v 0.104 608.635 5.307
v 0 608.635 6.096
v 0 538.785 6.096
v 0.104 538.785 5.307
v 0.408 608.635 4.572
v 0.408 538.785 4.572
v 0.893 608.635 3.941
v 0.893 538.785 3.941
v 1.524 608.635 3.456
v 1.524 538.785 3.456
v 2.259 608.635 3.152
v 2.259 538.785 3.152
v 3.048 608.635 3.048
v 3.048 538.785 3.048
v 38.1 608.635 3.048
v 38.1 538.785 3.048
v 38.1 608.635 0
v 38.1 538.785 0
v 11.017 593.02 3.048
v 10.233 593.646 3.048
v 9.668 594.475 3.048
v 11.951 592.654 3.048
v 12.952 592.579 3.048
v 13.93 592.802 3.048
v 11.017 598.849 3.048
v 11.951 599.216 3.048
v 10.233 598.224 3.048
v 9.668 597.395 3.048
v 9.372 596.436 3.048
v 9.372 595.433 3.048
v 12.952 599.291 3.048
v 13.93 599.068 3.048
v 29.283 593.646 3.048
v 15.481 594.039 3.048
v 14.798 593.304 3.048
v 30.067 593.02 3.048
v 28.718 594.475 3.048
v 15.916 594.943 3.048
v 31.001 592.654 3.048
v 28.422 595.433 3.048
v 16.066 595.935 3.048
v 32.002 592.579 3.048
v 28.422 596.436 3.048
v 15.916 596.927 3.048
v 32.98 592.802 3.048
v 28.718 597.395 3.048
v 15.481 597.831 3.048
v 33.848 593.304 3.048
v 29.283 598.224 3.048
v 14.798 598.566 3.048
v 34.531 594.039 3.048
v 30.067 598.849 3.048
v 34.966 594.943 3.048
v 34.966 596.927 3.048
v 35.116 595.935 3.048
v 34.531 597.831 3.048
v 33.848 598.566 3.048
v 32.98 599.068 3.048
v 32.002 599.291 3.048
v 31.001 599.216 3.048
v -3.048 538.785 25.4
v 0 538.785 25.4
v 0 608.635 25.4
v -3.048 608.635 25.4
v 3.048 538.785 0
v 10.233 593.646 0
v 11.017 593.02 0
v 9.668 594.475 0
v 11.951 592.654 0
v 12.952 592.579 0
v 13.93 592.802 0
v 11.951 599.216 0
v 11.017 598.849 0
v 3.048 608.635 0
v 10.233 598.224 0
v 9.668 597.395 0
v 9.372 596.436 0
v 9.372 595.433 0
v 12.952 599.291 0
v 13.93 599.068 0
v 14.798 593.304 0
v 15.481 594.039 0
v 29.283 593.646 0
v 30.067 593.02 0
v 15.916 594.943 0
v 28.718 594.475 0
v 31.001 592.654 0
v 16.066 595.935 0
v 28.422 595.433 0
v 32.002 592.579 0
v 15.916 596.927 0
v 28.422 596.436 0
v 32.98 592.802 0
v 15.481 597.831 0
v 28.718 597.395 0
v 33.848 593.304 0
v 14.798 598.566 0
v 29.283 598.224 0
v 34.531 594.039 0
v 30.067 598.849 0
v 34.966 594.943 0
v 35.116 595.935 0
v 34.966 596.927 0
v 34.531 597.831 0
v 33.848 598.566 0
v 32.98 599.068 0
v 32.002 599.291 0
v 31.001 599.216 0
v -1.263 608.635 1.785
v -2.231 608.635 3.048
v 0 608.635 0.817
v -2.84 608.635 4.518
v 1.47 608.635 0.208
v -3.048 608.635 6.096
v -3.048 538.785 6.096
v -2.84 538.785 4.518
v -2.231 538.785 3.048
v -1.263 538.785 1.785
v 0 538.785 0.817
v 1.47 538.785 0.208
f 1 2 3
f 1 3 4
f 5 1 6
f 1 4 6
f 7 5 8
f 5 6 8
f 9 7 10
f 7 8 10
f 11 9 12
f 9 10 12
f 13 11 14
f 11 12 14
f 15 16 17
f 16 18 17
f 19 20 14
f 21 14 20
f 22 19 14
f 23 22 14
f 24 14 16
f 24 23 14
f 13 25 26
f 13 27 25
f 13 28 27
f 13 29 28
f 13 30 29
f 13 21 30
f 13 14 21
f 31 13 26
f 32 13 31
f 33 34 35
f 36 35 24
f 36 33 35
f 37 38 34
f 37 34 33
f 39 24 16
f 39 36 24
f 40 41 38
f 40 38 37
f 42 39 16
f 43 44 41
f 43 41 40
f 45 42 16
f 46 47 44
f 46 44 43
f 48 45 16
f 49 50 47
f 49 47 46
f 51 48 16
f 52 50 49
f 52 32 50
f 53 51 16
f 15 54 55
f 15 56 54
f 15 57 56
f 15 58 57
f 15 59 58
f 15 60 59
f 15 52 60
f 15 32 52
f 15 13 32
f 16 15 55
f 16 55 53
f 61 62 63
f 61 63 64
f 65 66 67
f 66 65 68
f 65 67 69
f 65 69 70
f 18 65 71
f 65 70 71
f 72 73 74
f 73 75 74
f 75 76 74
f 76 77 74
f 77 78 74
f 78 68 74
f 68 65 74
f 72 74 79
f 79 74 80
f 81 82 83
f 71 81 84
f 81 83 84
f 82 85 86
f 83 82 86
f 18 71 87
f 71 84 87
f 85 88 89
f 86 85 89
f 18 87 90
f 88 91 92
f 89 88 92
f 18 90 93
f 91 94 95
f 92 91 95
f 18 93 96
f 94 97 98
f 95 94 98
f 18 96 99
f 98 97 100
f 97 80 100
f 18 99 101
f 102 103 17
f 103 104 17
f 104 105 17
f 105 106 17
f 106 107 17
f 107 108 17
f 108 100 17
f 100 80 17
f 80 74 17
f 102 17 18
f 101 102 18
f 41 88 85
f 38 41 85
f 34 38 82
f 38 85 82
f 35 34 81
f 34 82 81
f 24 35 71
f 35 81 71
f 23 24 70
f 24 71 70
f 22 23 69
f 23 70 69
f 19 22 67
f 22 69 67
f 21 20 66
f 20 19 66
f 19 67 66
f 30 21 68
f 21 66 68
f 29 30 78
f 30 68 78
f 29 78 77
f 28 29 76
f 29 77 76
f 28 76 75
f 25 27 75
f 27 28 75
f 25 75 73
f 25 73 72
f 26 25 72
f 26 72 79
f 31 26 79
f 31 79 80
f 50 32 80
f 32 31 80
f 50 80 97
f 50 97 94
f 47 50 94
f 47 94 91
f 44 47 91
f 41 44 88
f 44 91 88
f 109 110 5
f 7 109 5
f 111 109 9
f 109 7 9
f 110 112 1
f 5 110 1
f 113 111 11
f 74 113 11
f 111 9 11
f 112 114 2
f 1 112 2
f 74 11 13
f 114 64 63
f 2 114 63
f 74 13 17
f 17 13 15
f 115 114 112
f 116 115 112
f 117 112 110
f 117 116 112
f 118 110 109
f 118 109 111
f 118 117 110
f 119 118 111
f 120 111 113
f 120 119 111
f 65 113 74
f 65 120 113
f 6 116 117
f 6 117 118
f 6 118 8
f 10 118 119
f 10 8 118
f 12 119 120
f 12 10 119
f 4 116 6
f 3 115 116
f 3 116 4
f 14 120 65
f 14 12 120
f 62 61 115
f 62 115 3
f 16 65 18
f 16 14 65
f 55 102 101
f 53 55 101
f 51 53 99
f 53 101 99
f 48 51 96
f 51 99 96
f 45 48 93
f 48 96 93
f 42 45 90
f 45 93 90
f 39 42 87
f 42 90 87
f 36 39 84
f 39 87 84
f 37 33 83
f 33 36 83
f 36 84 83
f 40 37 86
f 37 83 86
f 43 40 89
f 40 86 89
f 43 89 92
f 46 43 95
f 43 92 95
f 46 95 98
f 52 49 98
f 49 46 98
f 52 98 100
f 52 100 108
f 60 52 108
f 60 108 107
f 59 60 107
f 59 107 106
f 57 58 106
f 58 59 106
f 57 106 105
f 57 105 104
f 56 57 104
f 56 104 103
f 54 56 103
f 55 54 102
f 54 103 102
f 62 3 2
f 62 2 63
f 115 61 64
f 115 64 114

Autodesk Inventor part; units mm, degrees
ref_plane "YZ Plane" through (0, 0, 0) normal (1, 0, 0) x (0, 1, 0)
ref_plane "XZ Plane" through (0, 0, 0) normal (0, 1, 0) x (-1, 0, 0)
ref_plane "XY Plane" through (0, 0, 0) normal (0, 0, 1) x (1, 0, 0)
sketch "Sketch1" plane through (0, 0, 0) normal (0, 0, 1) x (1, 0, 0)
  line L0 (0, 0) -> (38.1, 0)
  line L1 (38.1, 0) -> (38.1, 253.0348)
  arc A0 (38.1, 507.0348) -> (38.1, 253.0348) centre (666.75, 380.0348) ccw
  line L2 (38.1, 507.0348) -> (38.1, 608.6348)
  line L3 (38.1, 608.6348) -> (0, 608.6348)
  line L4 (0, 608.6348) -> (0, 0)
  circle A1 centre (31.75, 151.4348) radius 3.3655
  circle A2 centre (31.75, 34.671) radius 3.3655
  circle A3 centre (12.7, 12.7) radius 3.3655
  circle A4 centre (12.7, 342.9) radius 3.3655
  circle A5 centre (12.7, 595.9348) radius 3.3655
  circle A6 centre (31.75, 12.7) radius 3.3655
  circle A7 centre (31.75, 253.0348) radius 3.3655
  circle A8 centre (31.75, 507.0348) radius 3.3655
  circle A9 centre (31.75, 595.9348) radius 3.3655
  line L5 (0, 557.8348) -> (0, 608.6348)
  line L6 (0, 50.8) -> (0, 0)
  line L7 (12.7, 342.9) -> (0, 304.3174) construction
  line L8 (0, 317.5) -> (0, 368.3)
  line L9 (0, 129.921) -> (12.7, 129.921) construction
  circle A10 centre (12.7, 129.921) radius 3.3655
  circle A11 centre (12.7, 174.371) radius 3.3655
  line L10 (9.3413, 197.482) -> (9.3413, 204.213)
  line L11 (16.0611, 204.488) -> (16.0611, 197.3435)
  arc A12 (16.0611, 204.488) -> (9.3413, 204.213) centre (12.6956, 204.488) ccw
  arc A13 (9.3413, 197.482) -> (16.0611, 197.3435) centre (12.6974, 197.231) ccw
  circle A14 centre (12.7, 217.188) radius 3.3655
  dimension "d0" = 38.1
  dimension "d2" = 101.6
  dimension "d4" = 457.2
  dimension "d5" = 101.6
  dimension "d6" = 666.75
  dimension "d7" = 641.35
  dimension "d9" = 116.7638
  dimension "d10" = 6.35
  dimension "d11" = 6.35
  dimension "d13" = 12.7
  dimension "d14" = 12.7
  dimension "d16" = 12.7
  dimension "d17" = 342.9
  dimension "d19" = 12.7
  dimension "d20" = 12.7
  dimension "d22" = 6.35
  dimension "d24" = 6.35
  dimension "d25" = 6.731
  dimension "d26" = 6.35
  dimension "hole" = 6.731
  dimension "d28" = 6.35
  dimension "d45" = 12.7
  dimension "d47" = 12.7
  dimension "d54" = 6.731
  dimension "d55" = 3.3655
  dimension "d56" = 3.3655
  dimension "d58" = 6.731
  dimension "d59" = 12.7
  dimension "d68" = 18.22
  dimension "d69" = 90
  dimension "d70" = 90
  dimension "d71" = 22.0389
  dimension "d72" = 28.7587
  dimension "d73" = 478.7138
  dimension "d74" = 6.35
  dimension "d75" = 6.35
  dimension "d76" = 595.9348
  dimension "d77" = 404.1468
  dimension "d78" = 411.2913
  dimension "d79" = 25.4
  dimension "d80" = 25.4
  dimension "d81" = 434.2638
  dimension "d82" = 50.8
  dimension "d83" = 240.3348
  dimension "d84" = 291.1348
  dimension "d85" = 557.8348
extrude "Plate4" add sketch "Sketch1" along normal blind 3.048
sketch "Sketch5" plane through (0, 0, 3.048) normal (0, 0, 1) x (1, 0, 0)
  line L0 (38.1, 0) -> (38.1, 253.0348) projected
  line L1 (0, 0) -> (38.1, 0)
  line L2 (38.1, 0) -> (38.1, 25.4)
  line L3 (38.1, 25.4) -> (0, 25.4)
  line L4 (0, 25.4) -> (0, 0)
  dimension "d96" = 25.4
extrude "Cut1" cut sketch "Sketch5" against normal blind 3.048
sketch "Sketch7" plane through (0, 25.4, 3.048) normal (-1, 0, 0) x (0, -1, 0)
  line L0 (-583.2348, 0) -> (0, 0)
  line L1 (0, 0) -> (0, 22.352)
  line L2 (0, 22.352) -> (-583.2348, 22.352)
  line L3 (-583.2348, 22.352) -> (-583.2348, 0)
edge flange "Flange3" height 25.4 angle 90 thickness 3.048 bend radius 3.048 thickness toward (-1, 0, 0) relief tear relief width 3.048 relief depth 1.524 edges at (0, 317.0174, 3.048) wall of the first edge with corners at (0, 608.6348, 3.048) (0, 25.4, 3.048) (0, 25.4, 25.4) (0, 608.6348, 25.4)
bend "Bend3"
corner "Corner3"
sketch "Sketch9" plane through (38.1, 25.4, 0) normal (0, -1, 0) x (1, 0, 0)
  line L0 (0, 0) -> (-41.148, 0)
  line L1 (-41.148, 0) -> (-41.148, 25.4)
  line L2 (-41.148, 25.4) -> (0, 25.4)
  line L3 (0, 25.4) -> (0, 0)
  point P0 (-38.1, 0)
extrude "Extrusion2" cut sketch "Sketch9" against normal blind 513.3848
equation "\"d25\" = hole"
equation "\"d97\" = Thickness"
equation "\"d109\" = BendReliefWidth"
equation "\"d110\" = BendReliefDepth"
equation "\"d111\" = MinimumRemnant"
equation "\"d112\" = BendRadius"
equation "\"d115\" = BendRadius"
equation "\"d116\" = CornerReliefSize"
equation "\"d117\" = GapSize"
equation "\"d118\" = JacobiRadiusSize"
equation "\"BendRadius\" = Thickness"
equation "\"BendReliefWidth\" = Thickness"
equation "\"BendReliefDepth\" = 0.5 * Thickness"
equation "\"CornerReliefSize\" = 4 * Thickness"
equation "\"MinimumRemnant\" = 2 * Thickness"
equation "\"TransitionRadius\" = BendRadius"
equation "\"JacobiRadiusSize\" = BendRadius"
equation "\"GapSize\" = Thickness"
equation "\"d29\" = BendRadius"
equation "\"d32\" = BendRadius"
equation "\"d38\" = BendRadius"
equation "\"d60\" = BendRadius"
equation "\"Thickness\" = 3.048"
properties part number "Claw - Arm - Top (R) Top"
